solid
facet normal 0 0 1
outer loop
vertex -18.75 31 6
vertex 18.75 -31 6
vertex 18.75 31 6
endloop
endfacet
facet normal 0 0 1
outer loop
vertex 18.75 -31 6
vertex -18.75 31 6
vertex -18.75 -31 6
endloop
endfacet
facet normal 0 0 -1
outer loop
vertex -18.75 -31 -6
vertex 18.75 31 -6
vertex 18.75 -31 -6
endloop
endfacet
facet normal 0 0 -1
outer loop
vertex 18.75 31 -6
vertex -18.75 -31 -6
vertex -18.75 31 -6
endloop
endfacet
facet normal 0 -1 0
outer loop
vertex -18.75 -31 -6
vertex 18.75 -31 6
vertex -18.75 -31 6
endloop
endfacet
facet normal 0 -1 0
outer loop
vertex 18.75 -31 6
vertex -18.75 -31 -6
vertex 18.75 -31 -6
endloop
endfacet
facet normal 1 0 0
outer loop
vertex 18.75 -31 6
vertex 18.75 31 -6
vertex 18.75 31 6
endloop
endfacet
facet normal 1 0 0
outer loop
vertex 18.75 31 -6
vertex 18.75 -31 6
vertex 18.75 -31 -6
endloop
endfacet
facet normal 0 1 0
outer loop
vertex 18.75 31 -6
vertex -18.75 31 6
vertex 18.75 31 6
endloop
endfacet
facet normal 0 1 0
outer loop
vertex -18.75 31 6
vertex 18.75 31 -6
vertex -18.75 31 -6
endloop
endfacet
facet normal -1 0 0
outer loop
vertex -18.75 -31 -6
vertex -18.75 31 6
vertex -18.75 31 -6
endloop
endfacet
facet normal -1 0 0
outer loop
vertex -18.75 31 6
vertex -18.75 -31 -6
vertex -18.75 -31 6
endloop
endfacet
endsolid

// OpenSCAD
// file: configuration.scad
// eMAKEr Huxley
// Configuration file
// GNU GPL v2
// Jean-Marc Giacalone
// info@emakershop.com
// www.emakershop.com
// http://www.reprap.org/wiki/EMAKER_Huxley
// http://github.com/prusajr/eMAKERHuxley


//Round corner diameter
round_corner_diameter = 8;

//Thin wall size
layer_height = 0.4;
perimeter_width_over_thicknes = 1.6;
infill_widht_over_thickness = 1.55;
thin_wall = 2*(perimeter_width_over_thicknes*layer_height+infill_widht_over_thickness*layer_height);
if(thin_wall<2){
	echo("Check thin wall size, its below 2mm!");
}
echo(thin_wall);

// MINI-HUXLEY VERSION (TODO, just place holder)
// include <configuration-huxley.scad>
m3_dia_clr=3.5;
m6_diameter = 6;
m6_nut = 11.5;
bushing_diameter = 8;
motor_shaft=5;
bushing_rodsize = 6;
bushing_outerDiameter = 12;
bushing_lenght = 8;

// Some basic functions, probably should be somewhere else
// main file
include<configuration.scad>;
bushing_height=8;
socket_width=8;
socket_depth=4;
socket_clearance=0.2;
bushing_width=12;
bushing_rodsize=6.3;
bearing_length=4;
body_chamfers=1;
rod_clearance=1;//dia
partthick=12;

//body
module x_idler_body()
{
	translate([0,0,0]) cube([37.5,62,partthick], center=true);
}
//bushing holder socket
module bushing_socket()
{
	difference()
	{
		//positive
		union()
		{
			//body
			translate([0,socket_depth/2+6,0]) cube([socket_width+socket_clearance,socket_depth+socket_clearance,bushing_height+socket_clearance],center=true);
			translate([0,bushing_width/4,0]) cube([bushing_width,bushing_width/2+socket_clearance,bushing_height+socket_clearance],center=true);
			//screw hole
			translate([0,bushing_width/2+socket_depth,0]) rotate([-90,0,0])
				cylinder(h=socket_depth*1.6,r=2.7/2, $fn=8);
		}
		//negative
		//chamfers
		for(j=[0,1])
		{
			mirror([j,0,0]) union()
			{
				translate([bushing_width/2+socket_clearance/2,(bushing_width+socket_clearance)/2,0]) rotate([0,0,45]) cube([body_chamfers*sqrt(2),body_chamfers*sqrt(2),(bushing_height+socket_clearance)*2],center=true);
				translate([socket_width/2+socket_clearance/2,(bushing_width+socket_clearance)/2+socket_depth,0]) rotate([0,0,45]) cube([body_chamfers*sqrt(2),body_chamfers*sqrt(2),(bushing_height+socket_clearance)*2],center=true);
			}
		}
	}
}

//bushing_socket();
x_idler_body();
